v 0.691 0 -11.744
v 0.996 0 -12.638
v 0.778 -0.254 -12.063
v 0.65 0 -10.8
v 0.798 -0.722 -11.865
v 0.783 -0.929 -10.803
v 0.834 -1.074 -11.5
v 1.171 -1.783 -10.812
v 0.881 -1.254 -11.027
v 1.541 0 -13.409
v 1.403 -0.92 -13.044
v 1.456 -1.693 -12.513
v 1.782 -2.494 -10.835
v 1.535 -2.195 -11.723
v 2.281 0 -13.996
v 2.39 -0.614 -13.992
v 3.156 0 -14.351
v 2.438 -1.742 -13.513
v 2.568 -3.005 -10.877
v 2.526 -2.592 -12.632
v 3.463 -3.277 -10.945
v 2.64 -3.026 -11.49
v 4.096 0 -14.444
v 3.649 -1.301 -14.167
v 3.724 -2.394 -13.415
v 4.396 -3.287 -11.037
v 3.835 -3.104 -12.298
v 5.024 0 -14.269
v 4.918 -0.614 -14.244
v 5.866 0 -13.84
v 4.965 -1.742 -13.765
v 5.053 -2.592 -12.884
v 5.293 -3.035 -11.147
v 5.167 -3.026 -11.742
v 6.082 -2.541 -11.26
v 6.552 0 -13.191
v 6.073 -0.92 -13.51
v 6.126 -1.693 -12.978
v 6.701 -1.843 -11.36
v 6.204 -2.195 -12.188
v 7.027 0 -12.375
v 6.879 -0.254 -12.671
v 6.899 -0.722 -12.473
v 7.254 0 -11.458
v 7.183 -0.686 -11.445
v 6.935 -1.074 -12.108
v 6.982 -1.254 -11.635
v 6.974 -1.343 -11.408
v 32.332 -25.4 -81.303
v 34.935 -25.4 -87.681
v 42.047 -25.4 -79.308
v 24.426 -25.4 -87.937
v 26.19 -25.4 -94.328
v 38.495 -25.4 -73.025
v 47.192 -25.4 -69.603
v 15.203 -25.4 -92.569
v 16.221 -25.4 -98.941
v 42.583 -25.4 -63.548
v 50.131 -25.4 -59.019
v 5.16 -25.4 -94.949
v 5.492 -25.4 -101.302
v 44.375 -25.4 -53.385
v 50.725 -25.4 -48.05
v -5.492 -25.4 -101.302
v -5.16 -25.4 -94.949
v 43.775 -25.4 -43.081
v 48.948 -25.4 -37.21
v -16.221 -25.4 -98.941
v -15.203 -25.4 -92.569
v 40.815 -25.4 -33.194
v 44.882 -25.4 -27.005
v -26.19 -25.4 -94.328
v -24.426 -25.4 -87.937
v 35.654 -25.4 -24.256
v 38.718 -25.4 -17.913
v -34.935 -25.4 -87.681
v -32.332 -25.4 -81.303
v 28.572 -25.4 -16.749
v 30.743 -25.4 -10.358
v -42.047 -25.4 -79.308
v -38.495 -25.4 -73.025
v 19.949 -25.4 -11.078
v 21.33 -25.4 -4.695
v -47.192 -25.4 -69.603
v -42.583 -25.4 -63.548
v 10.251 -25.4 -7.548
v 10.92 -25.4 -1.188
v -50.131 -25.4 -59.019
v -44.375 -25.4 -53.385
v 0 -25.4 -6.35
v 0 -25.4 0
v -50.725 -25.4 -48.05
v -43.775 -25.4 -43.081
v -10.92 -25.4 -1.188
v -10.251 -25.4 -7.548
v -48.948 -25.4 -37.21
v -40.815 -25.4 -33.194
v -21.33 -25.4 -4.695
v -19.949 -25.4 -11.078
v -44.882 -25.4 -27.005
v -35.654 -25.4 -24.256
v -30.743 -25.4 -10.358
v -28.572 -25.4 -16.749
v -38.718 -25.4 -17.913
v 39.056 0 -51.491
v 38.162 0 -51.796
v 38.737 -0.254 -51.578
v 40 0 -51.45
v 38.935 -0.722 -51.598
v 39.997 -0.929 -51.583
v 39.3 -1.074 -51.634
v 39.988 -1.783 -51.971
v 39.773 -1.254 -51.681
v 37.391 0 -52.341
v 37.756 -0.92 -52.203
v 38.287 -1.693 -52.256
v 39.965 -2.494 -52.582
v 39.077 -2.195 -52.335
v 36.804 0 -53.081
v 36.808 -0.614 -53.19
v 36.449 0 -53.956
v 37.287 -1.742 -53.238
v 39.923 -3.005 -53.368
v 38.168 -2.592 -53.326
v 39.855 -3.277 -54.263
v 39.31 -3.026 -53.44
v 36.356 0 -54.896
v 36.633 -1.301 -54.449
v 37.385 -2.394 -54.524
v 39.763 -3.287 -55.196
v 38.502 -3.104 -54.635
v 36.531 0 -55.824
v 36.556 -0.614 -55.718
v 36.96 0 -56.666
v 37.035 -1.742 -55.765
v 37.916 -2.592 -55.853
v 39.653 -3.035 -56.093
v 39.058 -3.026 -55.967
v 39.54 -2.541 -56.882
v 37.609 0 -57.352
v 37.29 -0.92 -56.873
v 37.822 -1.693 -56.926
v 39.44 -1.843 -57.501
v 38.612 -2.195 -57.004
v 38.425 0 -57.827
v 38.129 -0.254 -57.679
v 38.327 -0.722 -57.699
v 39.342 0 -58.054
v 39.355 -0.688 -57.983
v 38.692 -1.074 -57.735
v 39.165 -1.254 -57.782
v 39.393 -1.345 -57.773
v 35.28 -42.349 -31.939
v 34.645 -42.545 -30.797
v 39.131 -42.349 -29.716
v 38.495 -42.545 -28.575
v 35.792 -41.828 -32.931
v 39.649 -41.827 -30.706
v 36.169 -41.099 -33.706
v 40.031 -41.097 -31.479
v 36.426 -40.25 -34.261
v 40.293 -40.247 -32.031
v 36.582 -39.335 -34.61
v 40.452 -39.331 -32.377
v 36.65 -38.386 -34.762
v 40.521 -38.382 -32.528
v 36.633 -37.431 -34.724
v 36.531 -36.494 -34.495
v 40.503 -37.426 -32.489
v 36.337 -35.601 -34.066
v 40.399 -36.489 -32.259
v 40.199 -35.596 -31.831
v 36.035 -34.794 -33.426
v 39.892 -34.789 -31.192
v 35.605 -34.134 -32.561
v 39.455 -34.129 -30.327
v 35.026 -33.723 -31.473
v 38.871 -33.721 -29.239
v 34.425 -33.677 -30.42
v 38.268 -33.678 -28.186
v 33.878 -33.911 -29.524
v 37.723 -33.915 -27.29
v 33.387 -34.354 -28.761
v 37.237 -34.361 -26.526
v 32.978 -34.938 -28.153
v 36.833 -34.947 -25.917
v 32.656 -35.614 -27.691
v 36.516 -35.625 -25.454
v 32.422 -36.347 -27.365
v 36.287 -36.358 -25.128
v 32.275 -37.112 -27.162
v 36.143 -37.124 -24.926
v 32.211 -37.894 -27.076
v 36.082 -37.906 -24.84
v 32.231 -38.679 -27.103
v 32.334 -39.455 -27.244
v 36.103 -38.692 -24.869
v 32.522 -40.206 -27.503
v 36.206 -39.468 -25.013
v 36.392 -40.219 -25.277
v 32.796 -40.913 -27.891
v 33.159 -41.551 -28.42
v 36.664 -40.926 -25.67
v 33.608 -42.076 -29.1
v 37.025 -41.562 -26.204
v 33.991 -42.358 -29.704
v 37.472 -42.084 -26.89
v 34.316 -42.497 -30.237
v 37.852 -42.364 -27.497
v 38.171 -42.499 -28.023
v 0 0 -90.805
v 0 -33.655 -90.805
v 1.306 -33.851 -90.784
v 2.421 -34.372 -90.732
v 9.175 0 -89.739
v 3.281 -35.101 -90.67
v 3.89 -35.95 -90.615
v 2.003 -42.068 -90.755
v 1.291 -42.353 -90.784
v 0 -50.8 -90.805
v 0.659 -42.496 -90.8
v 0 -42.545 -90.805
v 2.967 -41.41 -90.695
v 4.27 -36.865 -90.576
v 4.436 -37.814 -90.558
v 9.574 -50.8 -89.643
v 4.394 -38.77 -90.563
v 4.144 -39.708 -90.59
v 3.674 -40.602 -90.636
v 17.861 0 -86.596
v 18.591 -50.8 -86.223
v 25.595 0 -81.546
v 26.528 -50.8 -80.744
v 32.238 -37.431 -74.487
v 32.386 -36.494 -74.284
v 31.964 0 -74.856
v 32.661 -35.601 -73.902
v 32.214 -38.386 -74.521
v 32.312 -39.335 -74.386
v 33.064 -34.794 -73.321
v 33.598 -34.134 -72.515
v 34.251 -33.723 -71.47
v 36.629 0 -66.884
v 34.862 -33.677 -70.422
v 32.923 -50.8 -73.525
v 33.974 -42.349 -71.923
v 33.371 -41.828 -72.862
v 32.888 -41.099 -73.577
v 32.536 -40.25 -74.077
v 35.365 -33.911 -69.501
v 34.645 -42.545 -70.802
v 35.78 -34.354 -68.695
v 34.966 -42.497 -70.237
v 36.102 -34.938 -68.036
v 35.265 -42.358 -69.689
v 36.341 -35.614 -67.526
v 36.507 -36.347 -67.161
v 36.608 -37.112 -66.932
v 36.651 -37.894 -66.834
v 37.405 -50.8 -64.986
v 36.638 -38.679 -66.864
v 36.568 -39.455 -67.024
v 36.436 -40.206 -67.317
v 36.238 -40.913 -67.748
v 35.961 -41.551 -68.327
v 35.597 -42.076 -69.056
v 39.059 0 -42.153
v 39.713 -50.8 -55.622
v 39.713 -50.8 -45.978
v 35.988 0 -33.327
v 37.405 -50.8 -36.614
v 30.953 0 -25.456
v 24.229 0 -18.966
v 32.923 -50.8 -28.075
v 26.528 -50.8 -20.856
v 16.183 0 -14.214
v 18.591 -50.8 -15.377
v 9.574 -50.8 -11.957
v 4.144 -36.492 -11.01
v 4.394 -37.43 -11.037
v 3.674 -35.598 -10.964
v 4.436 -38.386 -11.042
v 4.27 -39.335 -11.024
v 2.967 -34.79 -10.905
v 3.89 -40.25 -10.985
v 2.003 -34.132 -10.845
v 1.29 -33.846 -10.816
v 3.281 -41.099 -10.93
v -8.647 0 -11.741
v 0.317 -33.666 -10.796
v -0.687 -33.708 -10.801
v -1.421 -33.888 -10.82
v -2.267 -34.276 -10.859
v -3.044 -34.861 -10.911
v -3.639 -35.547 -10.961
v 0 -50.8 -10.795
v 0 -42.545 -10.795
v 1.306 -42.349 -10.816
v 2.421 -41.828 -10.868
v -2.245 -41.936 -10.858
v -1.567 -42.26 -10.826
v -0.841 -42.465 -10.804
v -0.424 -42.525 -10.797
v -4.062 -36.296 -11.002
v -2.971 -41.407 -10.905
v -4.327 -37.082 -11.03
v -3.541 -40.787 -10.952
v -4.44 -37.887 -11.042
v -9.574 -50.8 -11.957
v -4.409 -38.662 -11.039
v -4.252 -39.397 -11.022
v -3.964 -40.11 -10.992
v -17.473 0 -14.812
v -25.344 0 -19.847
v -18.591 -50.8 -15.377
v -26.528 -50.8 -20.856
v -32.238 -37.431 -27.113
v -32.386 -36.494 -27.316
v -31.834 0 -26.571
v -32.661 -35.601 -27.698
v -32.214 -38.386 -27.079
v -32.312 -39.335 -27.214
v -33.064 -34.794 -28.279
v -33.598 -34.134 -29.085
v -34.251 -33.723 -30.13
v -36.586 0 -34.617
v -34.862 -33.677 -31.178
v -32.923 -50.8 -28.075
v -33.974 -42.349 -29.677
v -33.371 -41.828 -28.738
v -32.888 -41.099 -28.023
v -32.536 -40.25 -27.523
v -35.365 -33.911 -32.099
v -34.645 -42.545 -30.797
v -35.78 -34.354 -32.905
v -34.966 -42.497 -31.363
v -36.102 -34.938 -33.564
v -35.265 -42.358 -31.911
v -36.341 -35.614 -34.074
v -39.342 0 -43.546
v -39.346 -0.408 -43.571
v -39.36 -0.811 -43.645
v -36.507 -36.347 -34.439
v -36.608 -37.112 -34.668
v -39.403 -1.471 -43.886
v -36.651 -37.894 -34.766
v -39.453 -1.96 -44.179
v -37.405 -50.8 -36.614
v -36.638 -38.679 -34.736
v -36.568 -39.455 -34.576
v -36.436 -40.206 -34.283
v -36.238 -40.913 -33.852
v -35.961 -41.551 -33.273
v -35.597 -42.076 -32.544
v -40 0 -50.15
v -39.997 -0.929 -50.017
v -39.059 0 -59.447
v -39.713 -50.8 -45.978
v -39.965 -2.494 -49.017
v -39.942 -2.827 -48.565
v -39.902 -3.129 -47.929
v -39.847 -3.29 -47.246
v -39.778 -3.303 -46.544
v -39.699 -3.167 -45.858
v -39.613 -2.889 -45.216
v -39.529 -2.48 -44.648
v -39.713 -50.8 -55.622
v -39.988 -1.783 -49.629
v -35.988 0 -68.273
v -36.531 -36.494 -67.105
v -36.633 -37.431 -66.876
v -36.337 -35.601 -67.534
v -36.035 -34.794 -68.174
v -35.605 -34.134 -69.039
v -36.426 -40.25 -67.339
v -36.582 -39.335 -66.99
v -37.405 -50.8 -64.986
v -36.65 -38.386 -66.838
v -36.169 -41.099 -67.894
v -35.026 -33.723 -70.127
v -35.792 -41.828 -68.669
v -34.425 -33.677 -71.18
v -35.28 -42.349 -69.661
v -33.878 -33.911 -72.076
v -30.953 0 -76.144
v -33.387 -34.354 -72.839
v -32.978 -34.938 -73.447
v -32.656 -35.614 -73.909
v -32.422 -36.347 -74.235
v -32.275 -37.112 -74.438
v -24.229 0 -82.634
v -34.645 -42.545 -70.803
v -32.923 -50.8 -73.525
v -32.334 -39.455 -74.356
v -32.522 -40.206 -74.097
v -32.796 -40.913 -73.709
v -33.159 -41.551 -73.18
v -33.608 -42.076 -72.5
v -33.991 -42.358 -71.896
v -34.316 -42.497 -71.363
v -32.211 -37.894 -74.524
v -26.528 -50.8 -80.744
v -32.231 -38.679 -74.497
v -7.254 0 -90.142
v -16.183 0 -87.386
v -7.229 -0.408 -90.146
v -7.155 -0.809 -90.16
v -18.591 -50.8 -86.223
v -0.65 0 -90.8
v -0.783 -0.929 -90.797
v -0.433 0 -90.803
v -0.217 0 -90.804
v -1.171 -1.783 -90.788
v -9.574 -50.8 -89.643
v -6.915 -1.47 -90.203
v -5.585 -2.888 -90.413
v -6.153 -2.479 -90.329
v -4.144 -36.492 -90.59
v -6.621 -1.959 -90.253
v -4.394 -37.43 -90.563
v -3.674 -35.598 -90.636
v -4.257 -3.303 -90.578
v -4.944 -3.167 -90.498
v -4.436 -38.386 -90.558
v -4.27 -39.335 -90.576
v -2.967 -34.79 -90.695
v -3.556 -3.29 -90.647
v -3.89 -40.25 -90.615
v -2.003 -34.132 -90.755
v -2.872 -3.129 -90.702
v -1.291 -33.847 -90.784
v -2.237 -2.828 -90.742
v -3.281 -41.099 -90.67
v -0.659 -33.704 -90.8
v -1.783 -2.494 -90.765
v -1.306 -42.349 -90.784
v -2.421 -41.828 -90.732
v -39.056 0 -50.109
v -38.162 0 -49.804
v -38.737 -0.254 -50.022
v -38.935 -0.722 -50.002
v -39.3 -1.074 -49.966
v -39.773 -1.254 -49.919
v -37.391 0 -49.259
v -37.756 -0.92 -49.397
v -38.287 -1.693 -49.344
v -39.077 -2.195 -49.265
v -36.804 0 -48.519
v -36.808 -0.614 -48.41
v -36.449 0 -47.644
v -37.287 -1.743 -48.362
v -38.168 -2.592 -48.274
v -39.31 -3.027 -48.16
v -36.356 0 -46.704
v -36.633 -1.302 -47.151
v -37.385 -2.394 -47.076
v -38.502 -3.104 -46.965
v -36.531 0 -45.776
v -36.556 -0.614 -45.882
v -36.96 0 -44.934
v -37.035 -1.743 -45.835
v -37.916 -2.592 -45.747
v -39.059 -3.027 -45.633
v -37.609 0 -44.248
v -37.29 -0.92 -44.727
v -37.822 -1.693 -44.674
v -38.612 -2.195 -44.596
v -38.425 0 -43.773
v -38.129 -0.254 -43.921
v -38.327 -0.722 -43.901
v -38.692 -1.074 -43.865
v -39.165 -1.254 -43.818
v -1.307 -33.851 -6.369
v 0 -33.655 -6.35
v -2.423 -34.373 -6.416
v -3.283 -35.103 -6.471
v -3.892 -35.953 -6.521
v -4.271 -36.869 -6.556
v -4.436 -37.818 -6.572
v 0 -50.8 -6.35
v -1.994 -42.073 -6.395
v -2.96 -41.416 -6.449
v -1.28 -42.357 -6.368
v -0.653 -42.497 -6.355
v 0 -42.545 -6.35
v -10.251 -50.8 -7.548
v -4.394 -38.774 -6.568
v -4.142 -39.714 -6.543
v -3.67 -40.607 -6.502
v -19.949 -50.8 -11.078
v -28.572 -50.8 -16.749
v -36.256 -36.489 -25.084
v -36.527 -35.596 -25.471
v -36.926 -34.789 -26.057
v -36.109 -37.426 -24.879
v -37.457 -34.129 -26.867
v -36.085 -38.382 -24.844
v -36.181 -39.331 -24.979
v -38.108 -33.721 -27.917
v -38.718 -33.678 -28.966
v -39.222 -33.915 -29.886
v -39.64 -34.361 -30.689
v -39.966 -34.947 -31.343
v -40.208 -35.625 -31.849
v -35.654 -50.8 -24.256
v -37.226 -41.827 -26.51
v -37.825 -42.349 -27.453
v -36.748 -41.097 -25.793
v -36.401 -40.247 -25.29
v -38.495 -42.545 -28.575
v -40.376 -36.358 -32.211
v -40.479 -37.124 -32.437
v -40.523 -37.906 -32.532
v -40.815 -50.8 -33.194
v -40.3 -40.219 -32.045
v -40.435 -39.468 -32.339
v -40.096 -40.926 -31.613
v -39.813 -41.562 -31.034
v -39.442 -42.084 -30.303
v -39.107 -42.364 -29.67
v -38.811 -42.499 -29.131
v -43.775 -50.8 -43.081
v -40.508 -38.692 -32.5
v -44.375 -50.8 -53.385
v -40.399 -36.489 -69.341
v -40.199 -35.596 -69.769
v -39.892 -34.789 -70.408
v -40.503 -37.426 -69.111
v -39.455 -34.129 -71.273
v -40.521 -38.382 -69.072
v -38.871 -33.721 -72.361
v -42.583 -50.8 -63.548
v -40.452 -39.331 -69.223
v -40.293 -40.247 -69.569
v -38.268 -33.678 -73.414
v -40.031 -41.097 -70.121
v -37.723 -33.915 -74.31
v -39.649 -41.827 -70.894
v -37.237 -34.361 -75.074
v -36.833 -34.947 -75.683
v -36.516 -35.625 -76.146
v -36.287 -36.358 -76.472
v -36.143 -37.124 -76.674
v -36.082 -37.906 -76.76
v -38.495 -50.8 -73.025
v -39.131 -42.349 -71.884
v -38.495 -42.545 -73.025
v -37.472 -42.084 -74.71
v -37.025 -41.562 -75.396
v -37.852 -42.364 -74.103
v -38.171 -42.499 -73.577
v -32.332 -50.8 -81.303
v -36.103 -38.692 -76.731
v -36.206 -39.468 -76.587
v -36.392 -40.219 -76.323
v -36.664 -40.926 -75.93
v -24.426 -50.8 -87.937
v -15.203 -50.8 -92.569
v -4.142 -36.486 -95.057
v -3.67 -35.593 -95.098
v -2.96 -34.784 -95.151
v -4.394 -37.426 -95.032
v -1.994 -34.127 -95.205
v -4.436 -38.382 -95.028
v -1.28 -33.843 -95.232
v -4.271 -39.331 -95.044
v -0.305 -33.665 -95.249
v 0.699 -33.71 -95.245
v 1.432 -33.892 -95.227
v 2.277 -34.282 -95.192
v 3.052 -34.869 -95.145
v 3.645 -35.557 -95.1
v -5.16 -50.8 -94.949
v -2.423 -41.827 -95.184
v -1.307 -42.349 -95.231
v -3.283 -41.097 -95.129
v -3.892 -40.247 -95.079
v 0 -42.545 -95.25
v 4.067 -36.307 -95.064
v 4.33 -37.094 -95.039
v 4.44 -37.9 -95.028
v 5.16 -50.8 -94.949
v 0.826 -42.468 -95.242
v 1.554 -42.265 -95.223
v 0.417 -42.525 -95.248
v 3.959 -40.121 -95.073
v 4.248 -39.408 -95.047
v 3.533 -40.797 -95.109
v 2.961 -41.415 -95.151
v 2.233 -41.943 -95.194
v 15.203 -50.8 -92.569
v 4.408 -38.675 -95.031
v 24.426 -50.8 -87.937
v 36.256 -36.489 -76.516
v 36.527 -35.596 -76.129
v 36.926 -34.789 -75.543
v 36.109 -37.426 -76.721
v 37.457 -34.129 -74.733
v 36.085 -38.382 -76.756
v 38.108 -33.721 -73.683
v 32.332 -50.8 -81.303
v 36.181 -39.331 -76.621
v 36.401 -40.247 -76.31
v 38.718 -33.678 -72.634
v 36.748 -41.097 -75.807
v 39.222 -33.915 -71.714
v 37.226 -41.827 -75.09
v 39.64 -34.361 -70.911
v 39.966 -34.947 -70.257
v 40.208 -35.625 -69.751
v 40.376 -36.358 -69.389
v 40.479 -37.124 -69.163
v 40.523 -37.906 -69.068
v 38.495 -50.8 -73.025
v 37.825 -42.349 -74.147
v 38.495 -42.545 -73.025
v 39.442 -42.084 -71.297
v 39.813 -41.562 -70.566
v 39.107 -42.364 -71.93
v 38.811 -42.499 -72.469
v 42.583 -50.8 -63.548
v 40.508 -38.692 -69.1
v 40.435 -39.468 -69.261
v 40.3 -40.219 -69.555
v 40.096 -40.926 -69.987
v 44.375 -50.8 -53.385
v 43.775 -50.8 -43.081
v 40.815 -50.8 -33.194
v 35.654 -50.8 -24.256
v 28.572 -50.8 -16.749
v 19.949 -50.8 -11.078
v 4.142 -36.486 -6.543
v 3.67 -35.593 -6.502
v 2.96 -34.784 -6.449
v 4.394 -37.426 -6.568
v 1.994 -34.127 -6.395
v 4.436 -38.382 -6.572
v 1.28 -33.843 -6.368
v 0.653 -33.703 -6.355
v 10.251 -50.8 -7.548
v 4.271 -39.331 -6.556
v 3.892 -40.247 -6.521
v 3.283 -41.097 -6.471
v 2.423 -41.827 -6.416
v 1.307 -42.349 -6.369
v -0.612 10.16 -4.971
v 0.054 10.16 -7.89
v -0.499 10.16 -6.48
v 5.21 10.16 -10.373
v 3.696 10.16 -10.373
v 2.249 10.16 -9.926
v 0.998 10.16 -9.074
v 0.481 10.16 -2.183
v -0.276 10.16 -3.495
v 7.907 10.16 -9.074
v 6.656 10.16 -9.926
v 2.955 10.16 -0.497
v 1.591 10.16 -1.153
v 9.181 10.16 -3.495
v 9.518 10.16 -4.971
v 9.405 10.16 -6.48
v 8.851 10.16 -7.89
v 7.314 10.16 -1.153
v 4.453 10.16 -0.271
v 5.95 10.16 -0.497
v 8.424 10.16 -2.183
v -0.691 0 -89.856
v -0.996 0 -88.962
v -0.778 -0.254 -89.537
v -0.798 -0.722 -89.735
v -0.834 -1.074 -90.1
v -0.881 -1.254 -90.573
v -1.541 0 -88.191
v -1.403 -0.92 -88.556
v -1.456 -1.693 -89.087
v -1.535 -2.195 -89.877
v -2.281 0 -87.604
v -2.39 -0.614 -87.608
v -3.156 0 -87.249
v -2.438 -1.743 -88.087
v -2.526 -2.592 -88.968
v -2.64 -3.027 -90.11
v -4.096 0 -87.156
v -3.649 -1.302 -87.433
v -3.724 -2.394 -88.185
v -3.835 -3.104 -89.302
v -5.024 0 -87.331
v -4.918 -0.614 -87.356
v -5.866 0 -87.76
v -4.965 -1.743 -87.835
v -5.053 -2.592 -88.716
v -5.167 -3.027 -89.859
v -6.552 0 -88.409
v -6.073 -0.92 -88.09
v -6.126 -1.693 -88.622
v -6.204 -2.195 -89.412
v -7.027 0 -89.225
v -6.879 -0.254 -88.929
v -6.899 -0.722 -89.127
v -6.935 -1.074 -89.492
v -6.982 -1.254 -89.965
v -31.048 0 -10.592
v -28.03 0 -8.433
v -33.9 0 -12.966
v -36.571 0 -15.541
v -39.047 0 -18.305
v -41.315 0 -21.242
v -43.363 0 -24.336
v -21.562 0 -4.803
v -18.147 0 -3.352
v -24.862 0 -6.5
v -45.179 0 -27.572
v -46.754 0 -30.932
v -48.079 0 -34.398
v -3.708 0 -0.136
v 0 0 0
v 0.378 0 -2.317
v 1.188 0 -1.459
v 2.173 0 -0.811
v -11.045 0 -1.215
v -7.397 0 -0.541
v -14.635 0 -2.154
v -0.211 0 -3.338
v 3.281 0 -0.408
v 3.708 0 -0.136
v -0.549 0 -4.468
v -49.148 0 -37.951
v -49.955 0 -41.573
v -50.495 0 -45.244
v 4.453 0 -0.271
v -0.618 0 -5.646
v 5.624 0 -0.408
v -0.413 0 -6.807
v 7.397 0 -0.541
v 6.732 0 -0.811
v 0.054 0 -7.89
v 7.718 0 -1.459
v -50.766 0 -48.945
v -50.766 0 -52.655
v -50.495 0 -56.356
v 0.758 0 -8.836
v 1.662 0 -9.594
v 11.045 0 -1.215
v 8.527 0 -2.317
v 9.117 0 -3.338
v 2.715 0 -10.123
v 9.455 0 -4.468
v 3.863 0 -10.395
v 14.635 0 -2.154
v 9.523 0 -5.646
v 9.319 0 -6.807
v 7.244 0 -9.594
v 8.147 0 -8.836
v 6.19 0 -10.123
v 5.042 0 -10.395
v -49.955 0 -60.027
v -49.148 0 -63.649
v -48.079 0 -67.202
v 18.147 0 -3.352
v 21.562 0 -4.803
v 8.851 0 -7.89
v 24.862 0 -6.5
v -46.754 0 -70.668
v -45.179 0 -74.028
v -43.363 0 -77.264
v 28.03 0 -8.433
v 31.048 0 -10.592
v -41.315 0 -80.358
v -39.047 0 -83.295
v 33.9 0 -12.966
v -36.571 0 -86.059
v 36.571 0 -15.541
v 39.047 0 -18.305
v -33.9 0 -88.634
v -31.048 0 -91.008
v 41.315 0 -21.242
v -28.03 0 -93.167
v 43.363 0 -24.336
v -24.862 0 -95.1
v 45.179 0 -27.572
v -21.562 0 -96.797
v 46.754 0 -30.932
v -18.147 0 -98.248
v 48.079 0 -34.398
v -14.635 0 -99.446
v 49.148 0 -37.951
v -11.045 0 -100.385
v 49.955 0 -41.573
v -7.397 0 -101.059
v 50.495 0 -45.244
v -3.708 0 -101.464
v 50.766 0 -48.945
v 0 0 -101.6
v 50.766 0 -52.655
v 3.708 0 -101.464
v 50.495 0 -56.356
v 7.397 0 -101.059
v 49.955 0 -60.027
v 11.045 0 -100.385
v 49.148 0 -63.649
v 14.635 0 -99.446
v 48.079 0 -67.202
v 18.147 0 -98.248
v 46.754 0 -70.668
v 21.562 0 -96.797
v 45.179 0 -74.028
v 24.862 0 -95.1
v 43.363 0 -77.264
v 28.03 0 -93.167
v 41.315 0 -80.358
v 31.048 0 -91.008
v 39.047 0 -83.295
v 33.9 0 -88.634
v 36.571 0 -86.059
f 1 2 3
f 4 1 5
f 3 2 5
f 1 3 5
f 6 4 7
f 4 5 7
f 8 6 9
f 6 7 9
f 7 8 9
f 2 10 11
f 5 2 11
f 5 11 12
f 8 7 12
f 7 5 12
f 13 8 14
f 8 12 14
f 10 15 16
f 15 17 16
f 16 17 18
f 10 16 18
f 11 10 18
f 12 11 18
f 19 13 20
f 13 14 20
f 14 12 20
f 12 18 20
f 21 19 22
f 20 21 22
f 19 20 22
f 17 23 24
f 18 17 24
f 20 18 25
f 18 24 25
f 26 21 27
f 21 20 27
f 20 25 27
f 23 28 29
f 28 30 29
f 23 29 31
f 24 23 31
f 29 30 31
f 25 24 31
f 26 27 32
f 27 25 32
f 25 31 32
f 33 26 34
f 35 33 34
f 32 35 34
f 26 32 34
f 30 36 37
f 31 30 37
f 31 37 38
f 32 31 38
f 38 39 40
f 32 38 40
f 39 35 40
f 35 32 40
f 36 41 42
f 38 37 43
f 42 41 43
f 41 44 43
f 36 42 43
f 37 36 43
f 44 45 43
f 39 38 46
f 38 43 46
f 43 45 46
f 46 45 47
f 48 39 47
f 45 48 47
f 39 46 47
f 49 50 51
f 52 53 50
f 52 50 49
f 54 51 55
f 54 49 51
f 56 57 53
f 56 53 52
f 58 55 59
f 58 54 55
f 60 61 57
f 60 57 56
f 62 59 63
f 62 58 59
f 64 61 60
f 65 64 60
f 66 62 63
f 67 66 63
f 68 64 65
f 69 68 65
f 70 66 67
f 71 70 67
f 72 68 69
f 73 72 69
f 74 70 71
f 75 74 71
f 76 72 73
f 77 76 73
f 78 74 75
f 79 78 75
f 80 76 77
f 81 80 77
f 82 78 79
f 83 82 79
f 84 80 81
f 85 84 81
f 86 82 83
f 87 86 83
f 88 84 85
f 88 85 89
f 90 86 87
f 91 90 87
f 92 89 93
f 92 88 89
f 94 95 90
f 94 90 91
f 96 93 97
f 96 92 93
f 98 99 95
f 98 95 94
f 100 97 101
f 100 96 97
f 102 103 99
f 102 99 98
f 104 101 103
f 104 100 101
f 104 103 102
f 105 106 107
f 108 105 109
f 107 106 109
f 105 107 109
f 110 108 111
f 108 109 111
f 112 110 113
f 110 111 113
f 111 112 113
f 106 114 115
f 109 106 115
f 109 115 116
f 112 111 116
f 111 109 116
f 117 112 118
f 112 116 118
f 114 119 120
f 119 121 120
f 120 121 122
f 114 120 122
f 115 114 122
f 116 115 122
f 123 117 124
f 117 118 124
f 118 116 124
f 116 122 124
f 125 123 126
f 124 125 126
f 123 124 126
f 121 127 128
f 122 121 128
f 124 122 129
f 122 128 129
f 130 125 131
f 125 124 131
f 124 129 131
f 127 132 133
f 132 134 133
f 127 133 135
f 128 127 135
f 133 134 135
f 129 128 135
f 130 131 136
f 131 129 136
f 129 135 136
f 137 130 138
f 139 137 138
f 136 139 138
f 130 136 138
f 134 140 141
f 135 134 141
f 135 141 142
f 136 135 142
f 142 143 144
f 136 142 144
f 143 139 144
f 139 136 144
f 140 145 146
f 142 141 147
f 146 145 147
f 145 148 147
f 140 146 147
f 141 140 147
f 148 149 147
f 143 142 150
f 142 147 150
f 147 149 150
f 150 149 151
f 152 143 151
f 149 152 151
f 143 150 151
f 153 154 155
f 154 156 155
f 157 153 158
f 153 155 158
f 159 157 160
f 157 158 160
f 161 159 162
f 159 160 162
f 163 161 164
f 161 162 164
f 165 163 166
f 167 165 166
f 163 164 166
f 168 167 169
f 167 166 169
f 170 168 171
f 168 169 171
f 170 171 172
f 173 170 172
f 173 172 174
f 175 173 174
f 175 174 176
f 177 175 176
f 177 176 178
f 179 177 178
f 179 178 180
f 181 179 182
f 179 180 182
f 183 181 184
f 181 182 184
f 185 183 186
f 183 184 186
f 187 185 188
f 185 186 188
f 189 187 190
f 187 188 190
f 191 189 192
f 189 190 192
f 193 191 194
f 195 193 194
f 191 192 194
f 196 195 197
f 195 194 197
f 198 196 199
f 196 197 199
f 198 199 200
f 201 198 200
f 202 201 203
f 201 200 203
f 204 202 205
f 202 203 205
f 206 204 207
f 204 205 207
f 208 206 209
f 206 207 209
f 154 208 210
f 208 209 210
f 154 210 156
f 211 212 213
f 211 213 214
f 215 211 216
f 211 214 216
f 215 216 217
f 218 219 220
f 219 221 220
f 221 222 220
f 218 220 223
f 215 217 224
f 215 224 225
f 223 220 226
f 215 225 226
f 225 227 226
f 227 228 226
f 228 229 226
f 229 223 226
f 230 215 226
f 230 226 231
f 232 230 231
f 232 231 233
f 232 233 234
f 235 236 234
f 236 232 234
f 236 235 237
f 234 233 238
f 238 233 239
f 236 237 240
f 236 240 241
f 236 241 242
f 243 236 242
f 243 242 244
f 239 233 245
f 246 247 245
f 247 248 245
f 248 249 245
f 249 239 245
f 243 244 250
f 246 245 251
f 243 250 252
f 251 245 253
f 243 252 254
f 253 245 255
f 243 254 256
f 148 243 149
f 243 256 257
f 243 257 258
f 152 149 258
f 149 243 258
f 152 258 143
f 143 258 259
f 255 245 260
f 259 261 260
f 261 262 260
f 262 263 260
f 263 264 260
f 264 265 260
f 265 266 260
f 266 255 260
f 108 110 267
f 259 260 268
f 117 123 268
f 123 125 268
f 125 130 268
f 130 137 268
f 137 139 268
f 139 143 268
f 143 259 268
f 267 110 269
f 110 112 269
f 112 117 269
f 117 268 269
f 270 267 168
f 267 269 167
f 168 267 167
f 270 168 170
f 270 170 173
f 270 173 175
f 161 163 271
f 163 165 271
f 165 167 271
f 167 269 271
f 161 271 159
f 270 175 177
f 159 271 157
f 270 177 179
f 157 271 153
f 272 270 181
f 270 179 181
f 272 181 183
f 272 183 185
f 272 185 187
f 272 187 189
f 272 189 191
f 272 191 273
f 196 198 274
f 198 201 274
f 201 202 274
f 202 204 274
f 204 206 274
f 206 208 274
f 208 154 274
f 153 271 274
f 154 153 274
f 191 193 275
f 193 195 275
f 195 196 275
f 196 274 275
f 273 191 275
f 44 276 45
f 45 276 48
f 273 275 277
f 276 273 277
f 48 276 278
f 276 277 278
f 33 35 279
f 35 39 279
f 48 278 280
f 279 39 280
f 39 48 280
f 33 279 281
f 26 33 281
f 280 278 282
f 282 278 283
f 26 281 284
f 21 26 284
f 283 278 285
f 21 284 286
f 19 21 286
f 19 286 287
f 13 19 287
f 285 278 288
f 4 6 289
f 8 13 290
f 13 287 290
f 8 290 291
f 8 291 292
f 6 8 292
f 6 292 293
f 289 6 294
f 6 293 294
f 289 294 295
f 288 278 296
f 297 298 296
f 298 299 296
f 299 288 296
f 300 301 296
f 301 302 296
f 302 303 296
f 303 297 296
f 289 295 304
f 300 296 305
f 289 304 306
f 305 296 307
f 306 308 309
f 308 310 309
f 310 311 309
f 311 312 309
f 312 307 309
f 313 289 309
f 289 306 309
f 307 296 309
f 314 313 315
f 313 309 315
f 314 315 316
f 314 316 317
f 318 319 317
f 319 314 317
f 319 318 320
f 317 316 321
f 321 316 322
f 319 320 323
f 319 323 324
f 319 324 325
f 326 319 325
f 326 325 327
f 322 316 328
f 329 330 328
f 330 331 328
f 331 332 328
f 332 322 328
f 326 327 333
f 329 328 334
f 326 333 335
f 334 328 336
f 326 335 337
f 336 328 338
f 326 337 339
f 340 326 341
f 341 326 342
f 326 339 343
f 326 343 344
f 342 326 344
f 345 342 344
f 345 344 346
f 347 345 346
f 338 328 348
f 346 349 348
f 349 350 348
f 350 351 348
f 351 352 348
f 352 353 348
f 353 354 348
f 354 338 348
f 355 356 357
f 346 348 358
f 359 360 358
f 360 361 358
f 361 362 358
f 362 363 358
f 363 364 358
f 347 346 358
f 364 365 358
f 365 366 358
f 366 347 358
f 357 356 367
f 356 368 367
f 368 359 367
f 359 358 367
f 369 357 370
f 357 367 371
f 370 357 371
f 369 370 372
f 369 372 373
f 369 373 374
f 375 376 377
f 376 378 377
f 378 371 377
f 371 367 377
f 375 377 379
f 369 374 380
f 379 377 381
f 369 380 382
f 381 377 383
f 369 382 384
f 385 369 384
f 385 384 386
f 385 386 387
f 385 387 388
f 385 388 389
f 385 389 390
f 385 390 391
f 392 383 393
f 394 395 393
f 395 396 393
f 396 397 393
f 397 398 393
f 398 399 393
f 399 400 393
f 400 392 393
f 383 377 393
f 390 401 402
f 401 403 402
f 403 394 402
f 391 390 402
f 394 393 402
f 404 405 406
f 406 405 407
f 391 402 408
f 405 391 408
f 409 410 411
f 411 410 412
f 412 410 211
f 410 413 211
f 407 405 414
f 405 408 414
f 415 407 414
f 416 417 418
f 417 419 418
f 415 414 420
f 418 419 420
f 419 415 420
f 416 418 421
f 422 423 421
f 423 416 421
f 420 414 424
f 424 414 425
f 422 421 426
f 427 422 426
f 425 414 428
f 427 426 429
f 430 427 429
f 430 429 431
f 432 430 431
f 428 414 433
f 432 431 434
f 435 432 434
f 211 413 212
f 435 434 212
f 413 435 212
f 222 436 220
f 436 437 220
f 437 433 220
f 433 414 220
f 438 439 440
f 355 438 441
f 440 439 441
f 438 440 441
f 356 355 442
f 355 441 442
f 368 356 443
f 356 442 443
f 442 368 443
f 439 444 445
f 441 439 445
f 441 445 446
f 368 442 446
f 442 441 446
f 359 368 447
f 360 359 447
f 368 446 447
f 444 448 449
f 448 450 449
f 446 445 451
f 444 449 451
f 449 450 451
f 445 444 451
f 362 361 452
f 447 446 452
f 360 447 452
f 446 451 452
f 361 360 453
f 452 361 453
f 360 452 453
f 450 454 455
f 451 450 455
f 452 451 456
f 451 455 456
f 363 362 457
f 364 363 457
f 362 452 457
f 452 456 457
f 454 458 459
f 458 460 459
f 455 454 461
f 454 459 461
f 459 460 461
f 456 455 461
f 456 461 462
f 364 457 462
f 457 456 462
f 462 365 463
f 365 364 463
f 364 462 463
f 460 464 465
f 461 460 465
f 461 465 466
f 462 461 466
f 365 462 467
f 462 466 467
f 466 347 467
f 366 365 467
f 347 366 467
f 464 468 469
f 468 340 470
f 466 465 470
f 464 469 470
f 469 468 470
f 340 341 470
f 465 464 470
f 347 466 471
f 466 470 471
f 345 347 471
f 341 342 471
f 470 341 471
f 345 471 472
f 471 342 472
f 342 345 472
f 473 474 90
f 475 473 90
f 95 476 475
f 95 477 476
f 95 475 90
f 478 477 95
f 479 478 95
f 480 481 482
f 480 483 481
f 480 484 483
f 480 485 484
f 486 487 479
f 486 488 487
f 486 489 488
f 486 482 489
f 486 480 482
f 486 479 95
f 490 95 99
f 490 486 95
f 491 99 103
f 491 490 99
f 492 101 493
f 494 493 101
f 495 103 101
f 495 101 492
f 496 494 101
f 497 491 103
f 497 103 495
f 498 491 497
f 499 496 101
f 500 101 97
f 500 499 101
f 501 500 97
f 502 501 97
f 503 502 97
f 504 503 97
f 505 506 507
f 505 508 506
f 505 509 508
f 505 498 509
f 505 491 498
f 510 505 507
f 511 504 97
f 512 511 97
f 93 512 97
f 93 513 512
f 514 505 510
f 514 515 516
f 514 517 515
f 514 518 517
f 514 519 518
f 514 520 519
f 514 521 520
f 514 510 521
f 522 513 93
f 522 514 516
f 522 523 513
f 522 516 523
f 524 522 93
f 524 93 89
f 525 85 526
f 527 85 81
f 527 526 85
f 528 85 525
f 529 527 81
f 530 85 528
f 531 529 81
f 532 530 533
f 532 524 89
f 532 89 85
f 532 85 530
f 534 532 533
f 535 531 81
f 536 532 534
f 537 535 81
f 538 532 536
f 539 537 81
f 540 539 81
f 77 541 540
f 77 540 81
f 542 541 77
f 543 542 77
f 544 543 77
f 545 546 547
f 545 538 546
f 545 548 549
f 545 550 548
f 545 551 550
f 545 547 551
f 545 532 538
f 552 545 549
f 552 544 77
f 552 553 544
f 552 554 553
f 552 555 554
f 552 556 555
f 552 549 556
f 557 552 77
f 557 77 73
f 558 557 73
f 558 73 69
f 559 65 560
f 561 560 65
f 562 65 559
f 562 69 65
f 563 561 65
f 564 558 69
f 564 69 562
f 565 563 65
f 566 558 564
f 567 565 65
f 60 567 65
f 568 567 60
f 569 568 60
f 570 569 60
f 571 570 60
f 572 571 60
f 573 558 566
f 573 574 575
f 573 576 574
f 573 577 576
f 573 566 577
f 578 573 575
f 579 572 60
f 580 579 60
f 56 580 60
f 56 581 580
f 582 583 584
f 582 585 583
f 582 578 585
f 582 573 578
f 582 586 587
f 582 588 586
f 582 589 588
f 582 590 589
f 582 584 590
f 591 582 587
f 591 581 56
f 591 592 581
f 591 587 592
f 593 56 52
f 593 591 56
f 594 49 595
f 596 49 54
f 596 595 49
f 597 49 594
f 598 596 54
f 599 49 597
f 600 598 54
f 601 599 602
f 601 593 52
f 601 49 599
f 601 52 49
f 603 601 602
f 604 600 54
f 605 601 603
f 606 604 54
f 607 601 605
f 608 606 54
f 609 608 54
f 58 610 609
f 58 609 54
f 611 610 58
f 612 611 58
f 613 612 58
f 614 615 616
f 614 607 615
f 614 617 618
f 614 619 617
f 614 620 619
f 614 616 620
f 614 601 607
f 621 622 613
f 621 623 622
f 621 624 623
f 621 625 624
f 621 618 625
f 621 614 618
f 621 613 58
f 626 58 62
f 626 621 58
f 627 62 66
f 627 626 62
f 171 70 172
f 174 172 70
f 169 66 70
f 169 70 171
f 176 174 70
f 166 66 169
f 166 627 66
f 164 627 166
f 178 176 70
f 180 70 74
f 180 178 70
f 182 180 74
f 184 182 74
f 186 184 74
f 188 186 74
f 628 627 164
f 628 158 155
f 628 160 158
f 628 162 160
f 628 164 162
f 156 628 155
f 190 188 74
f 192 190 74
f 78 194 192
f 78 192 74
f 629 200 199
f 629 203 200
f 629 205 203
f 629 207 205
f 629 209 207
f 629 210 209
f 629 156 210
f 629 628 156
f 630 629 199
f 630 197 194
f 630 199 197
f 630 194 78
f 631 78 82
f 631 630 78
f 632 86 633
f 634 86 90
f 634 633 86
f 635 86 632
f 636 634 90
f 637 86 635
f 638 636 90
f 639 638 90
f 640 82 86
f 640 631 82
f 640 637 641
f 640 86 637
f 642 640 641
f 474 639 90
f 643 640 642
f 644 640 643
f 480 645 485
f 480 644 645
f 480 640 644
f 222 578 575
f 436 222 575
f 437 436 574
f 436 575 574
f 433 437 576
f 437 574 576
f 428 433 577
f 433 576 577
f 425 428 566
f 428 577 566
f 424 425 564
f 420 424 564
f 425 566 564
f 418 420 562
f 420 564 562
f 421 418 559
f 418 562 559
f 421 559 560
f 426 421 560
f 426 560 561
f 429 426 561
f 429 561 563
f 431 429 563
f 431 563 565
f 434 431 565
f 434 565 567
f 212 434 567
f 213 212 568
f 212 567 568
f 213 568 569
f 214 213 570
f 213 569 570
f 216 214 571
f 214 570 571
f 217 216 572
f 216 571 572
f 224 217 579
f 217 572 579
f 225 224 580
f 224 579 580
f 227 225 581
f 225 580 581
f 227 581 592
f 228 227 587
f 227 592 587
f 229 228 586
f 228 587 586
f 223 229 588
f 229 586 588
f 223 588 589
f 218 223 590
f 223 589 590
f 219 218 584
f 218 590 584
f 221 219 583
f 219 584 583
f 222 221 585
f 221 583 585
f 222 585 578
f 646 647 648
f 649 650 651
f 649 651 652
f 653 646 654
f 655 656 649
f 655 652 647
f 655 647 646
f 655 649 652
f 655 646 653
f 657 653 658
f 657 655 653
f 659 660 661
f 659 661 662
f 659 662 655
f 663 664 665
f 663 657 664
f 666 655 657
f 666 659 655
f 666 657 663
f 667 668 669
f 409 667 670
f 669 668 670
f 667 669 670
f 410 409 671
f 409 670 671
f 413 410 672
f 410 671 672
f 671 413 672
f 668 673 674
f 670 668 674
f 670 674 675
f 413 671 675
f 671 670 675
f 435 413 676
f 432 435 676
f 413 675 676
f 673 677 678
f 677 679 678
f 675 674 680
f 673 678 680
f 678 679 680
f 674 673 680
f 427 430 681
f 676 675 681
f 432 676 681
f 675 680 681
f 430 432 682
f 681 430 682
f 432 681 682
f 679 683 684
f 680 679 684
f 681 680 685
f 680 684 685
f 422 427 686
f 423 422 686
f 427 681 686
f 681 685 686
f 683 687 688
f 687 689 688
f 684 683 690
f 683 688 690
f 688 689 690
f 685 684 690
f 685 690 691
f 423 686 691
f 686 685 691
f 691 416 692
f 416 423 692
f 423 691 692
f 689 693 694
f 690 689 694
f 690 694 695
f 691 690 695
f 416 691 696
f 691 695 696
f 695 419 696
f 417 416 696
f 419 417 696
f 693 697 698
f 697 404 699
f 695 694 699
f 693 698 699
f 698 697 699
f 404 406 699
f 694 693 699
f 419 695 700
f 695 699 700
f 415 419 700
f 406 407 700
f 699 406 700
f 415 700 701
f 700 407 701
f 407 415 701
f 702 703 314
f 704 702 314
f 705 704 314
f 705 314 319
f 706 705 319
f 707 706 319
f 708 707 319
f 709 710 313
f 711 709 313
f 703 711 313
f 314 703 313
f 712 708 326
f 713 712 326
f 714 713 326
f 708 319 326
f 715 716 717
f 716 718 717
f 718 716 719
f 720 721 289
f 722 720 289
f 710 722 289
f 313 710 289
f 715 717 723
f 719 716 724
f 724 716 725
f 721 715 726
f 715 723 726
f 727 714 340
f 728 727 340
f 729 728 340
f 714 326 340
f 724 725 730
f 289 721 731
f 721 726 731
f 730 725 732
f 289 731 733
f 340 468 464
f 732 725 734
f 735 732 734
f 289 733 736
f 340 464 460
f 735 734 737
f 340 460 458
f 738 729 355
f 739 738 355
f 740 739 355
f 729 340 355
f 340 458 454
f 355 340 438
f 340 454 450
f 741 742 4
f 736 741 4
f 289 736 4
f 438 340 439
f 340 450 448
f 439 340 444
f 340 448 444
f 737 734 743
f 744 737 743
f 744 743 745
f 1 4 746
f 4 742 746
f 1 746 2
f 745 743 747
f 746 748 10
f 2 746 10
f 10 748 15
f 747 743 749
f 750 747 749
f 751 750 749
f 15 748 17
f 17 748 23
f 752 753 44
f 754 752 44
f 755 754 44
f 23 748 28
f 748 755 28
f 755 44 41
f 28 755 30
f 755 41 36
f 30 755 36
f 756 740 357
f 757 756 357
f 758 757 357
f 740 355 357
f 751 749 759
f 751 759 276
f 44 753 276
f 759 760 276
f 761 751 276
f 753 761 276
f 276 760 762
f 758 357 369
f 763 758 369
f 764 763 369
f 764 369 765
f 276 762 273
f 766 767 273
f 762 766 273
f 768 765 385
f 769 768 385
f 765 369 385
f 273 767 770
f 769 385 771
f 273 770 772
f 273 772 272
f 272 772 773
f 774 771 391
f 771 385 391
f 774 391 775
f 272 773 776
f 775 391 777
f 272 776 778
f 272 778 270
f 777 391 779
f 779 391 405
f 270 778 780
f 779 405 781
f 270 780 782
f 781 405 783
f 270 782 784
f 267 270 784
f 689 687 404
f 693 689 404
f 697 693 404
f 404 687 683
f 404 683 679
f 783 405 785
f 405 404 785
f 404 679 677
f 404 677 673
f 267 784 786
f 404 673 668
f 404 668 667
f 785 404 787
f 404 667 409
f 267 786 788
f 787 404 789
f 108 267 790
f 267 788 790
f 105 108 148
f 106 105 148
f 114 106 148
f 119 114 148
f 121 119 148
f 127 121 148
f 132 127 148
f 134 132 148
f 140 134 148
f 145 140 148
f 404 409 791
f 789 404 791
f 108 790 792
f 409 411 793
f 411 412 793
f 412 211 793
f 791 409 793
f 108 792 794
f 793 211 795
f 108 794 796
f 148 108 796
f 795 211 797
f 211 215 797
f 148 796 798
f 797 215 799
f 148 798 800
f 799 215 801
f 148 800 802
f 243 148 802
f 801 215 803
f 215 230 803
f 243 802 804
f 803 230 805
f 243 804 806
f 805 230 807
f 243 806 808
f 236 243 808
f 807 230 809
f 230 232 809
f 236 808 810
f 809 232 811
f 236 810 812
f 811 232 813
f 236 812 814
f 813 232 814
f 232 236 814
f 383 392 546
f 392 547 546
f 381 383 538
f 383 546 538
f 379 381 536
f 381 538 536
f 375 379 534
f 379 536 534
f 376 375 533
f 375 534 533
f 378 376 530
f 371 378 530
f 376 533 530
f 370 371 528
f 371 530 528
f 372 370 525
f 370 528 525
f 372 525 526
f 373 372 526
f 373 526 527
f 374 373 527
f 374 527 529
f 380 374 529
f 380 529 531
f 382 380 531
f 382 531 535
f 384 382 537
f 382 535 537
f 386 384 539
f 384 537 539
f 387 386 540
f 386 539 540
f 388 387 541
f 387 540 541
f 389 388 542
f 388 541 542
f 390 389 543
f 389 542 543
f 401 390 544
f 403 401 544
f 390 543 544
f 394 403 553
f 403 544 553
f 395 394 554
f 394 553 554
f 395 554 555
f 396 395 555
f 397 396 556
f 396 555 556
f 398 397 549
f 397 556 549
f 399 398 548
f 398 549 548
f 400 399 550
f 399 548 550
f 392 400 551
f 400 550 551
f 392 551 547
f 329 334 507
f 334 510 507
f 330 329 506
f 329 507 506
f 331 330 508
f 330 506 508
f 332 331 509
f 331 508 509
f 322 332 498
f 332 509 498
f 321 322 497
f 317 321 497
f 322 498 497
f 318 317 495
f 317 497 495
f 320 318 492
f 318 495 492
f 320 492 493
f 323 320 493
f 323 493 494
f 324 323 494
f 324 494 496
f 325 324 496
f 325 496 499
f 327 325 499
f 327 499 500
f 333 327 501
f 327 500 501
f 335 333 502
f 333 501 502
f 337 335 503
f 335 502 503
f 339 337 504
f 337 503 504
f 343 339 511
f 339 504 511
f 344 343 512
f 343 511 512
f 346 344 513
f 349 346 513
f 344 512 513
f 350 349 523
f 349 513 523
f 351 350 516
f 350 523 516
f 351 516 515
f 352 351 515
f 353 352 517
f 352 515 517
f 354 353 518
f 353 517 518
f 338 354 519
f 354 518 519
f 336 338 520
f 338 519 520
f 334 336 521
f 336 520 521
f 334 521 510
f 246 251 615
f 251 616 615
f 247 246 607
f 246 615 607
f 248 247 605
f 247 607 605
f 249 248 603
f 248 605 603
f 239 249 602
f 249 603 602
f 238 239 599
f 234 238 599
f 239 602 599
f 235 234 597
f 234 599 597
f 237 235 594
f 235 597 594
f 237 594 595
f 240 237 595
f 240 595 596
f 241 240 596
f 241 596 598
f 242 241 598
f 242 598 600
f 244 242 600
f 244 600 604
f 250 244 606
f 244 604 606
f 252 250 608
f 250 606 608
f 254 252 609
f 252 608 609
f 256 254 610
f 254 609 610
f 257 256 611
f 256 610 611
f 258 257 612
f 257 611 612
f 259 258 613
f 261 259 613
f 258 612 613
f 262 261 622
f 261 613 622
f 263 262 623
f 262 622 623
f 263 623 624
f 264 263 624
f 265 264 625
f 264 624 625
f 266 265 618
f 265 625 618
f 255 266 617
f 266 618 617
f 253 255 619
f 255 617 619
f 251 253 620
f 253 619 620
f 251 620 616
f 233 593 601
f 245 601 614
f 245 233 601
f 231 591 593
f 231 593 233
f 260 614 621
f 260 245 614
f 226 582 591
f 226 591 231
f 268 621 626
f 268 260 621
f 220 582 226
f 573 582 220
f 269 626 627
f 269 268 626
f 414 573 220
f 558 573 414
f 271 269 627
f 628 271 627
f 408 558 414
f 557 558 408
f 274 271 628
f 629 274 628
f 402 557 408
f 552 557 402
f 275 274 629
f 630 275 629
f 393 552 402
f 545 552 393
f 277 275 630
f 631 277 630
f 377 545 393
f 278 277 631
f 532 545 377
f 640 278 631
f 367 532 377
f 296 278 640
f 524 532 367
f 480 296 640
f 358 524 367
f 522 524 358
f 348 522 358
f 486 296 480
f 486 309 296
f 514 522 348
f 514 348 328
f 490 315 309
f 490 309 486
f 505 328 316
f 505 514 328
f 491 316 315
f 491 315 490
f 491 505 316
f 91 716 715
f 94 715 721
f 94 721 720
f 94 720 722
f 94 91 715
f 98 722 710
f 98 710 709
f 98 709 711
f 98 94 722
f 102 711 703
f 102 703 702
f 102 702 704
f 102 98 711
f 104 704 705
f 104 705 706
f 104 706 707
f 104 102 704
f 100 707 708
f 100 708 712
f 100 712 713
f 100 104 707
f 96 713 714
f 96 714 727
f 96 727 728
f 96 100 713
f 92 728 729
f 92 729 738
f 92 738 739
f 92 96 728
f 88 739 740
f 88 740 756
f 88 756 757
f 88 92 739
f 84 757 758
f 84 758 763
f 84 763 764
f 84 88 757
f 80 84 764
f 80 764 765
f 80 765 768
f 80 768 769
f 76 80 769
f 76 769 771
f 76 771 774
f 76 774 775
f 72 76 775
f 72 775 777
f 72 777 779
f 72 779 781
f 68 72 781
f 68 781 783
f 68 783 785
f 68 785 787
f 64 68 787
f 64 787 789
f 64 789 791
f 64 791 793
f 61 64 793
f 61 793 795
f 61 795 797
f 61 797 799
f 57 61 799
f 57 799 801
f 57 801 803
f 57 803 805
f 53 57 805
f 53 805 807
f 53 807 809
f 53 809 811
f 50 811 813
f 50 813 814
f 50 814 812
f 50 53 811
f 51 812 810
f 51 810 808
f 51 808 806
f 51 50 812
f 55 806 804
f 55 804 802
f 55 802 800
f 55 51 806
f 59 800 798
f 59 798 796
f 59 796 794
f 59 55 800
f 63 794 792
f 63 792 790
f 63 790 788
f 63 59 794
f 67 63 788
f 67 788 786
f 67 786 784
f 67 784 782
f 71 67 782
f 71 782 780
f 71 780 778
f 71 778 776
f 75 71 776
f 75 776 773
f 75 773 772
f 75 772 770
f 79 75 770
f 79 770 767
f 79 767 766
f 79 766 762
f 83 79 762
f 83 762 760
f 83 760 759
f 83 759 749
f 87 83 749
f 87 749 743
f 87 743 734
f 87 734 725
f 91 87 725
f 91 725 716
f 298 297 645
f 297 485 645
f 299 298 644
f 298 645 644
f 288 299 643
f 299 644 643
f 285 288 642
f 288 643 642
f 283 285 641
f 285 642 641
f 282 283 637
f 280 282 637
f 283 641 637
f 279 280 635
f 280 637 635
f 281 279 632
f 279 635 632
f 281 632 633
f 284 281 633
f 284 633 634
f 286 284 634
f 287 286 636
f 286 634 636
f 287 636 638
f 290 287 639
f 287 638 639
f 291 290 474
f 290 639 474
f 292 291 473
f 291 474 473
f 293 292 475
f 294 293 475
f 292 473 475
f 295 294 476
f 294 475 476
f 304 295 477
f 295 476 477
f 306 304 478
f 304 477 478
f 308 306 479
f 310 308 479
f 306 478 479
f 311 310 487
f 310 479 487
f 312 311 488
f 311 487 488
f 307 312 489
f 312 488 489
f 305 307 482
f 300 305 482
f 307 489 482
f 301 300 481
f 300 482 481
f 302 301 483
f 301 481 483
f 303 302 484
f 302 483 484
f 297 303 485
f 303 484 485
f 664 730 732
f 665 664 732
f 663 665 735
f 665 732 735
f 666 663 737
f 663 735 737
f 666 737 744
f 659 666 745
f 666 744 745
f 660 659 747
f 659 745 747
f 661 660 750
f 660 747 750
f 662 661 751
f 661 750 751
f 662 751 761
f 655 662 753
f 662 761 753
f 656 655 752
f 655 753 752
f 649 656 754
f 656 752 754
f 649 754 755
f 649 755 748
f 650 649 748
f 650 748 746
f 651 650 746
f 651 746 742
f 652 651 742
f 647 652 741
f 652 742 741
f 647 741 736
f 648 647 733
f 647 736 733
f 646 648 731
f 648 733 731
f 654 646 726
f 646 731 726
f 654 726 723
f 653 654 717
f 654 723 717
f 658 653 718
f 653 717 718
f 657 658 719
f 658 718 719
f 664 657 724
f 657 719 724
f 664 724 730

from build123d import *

# Parameters (mm, degrees)
SKETCH8_R           = 4.445
CUT_EXTRUDE2_DEPTH  = 10.16
CIRPATTERN1_COUNT   = 6
SKETCH10_R          = 40.005
CUT_EXTRUDE4_DEPTH  = 125.434078974
REVOLVE4_ANGLE      = 180
CIRPATTERN2_COUNT   = 4
SKETCH16_R          = 5.079288484
BOSS_EXTRUDE1_DEPTH = 10.16


with BuildPart() as part:
    # Sketch1 → Revolve1 (revolve)
    with BuildSketch(Plane(origin=(0, 0, 0), x_dir=(0, 0, -1), z_dir=(1, 0, 0))):
        Polygon((0, 0), (0, -25.4), (6.35, -25.4), (6.35, -50.8), (12.7, -50.8), (12.7, 0), align=None)
    revolve(axis=Axis((0, 24.668312757, -50.8), (0, -1, 0)))

    # Sketch8 → Cut-Extrude2 (cut, symmetric)
    with BuildSketch(Plane.XY.offset(-6.707819403)):
        with Locations(Location((0, -38.1, 0), (0, 0, 270))):
            Circle(SKETCH8_R)
    cut_extrude2 = extrude(amount=CUT_EXTRUDE2_DEPTH, both=True, mode=Mode.SUBTRACT)

    # CirPattern1: Cut-Extrude2 ×6 about axis
    cirpattern1_axis = Axis((0, 24.668312757, -50.8), (0, 1, 0))
    for i in range(1, CIRPATTERN1_COUNT):
        add(cut_extrude2.rotate(cirpattern1_axis, i * 360 / CIRPATTERN1_COUNT), mode=Mode.SUBTRACT)

    # Sketch10 → Cut-Extrude4 (cut, through all)
    with BuildSketch(Plane.XZ.offset(50.8)):
        with Locations(Location((0, -50.8, 0), (0, 0, 270))):
            Circle(SKETCH10_R)
    extrude(amount=-CUT_EXTRUDE4_DEPTH, mode=Mode.SUBTRACT)

    # Sketch14 → Revolve4 (revolve)
    with BuildSketch(Plane(origin=(0, 0, 0), x_dir=(1, 0, 0), z_dir=(0, 1, 0))):
        with BuildLine():
            Line((7.253808844, 11.458135755), (0.649808844, 10.800277833))
            ThreePointArc((0.649808844, 10.800277833), (3.622879883, 14.431206794), (7.253808844, 11.458135755))
        make_face()
    revolve4 = revolve(axis=Axis((0.649808844, 0, -10.800277833), (-0.9950750421165625, 0, 0.09912447001987663)), revolution_arc=REVOLVE4_ANGLE)

    # CirPattern2: Revolve4 ×4 about axis
    cirpattern2_axis = Axis((0, 0, -50.8), (0, 1, 0))
    for i in range(1, CIRPATTERN2_COUNT):
        add(revolve4.rotate(cirpattern2_axis, i * 360 / CIRPATTERN2_COUNT))

    # Sketch16 → Boss-Extrude1 (add)
    with BuildSketch(Plane(origin=(0, 0, 0), x_dir=(1, 0, 0), z_dir=(0, 1, 0))):
        with Locations(Location((4.452646476, 5.350182374, 0), (0, 0, 270))):
            Circle(SKETCH16_R)
    extrude(amount=BOSS_EXTRUDE1_DEPTH)


solid = part.part
